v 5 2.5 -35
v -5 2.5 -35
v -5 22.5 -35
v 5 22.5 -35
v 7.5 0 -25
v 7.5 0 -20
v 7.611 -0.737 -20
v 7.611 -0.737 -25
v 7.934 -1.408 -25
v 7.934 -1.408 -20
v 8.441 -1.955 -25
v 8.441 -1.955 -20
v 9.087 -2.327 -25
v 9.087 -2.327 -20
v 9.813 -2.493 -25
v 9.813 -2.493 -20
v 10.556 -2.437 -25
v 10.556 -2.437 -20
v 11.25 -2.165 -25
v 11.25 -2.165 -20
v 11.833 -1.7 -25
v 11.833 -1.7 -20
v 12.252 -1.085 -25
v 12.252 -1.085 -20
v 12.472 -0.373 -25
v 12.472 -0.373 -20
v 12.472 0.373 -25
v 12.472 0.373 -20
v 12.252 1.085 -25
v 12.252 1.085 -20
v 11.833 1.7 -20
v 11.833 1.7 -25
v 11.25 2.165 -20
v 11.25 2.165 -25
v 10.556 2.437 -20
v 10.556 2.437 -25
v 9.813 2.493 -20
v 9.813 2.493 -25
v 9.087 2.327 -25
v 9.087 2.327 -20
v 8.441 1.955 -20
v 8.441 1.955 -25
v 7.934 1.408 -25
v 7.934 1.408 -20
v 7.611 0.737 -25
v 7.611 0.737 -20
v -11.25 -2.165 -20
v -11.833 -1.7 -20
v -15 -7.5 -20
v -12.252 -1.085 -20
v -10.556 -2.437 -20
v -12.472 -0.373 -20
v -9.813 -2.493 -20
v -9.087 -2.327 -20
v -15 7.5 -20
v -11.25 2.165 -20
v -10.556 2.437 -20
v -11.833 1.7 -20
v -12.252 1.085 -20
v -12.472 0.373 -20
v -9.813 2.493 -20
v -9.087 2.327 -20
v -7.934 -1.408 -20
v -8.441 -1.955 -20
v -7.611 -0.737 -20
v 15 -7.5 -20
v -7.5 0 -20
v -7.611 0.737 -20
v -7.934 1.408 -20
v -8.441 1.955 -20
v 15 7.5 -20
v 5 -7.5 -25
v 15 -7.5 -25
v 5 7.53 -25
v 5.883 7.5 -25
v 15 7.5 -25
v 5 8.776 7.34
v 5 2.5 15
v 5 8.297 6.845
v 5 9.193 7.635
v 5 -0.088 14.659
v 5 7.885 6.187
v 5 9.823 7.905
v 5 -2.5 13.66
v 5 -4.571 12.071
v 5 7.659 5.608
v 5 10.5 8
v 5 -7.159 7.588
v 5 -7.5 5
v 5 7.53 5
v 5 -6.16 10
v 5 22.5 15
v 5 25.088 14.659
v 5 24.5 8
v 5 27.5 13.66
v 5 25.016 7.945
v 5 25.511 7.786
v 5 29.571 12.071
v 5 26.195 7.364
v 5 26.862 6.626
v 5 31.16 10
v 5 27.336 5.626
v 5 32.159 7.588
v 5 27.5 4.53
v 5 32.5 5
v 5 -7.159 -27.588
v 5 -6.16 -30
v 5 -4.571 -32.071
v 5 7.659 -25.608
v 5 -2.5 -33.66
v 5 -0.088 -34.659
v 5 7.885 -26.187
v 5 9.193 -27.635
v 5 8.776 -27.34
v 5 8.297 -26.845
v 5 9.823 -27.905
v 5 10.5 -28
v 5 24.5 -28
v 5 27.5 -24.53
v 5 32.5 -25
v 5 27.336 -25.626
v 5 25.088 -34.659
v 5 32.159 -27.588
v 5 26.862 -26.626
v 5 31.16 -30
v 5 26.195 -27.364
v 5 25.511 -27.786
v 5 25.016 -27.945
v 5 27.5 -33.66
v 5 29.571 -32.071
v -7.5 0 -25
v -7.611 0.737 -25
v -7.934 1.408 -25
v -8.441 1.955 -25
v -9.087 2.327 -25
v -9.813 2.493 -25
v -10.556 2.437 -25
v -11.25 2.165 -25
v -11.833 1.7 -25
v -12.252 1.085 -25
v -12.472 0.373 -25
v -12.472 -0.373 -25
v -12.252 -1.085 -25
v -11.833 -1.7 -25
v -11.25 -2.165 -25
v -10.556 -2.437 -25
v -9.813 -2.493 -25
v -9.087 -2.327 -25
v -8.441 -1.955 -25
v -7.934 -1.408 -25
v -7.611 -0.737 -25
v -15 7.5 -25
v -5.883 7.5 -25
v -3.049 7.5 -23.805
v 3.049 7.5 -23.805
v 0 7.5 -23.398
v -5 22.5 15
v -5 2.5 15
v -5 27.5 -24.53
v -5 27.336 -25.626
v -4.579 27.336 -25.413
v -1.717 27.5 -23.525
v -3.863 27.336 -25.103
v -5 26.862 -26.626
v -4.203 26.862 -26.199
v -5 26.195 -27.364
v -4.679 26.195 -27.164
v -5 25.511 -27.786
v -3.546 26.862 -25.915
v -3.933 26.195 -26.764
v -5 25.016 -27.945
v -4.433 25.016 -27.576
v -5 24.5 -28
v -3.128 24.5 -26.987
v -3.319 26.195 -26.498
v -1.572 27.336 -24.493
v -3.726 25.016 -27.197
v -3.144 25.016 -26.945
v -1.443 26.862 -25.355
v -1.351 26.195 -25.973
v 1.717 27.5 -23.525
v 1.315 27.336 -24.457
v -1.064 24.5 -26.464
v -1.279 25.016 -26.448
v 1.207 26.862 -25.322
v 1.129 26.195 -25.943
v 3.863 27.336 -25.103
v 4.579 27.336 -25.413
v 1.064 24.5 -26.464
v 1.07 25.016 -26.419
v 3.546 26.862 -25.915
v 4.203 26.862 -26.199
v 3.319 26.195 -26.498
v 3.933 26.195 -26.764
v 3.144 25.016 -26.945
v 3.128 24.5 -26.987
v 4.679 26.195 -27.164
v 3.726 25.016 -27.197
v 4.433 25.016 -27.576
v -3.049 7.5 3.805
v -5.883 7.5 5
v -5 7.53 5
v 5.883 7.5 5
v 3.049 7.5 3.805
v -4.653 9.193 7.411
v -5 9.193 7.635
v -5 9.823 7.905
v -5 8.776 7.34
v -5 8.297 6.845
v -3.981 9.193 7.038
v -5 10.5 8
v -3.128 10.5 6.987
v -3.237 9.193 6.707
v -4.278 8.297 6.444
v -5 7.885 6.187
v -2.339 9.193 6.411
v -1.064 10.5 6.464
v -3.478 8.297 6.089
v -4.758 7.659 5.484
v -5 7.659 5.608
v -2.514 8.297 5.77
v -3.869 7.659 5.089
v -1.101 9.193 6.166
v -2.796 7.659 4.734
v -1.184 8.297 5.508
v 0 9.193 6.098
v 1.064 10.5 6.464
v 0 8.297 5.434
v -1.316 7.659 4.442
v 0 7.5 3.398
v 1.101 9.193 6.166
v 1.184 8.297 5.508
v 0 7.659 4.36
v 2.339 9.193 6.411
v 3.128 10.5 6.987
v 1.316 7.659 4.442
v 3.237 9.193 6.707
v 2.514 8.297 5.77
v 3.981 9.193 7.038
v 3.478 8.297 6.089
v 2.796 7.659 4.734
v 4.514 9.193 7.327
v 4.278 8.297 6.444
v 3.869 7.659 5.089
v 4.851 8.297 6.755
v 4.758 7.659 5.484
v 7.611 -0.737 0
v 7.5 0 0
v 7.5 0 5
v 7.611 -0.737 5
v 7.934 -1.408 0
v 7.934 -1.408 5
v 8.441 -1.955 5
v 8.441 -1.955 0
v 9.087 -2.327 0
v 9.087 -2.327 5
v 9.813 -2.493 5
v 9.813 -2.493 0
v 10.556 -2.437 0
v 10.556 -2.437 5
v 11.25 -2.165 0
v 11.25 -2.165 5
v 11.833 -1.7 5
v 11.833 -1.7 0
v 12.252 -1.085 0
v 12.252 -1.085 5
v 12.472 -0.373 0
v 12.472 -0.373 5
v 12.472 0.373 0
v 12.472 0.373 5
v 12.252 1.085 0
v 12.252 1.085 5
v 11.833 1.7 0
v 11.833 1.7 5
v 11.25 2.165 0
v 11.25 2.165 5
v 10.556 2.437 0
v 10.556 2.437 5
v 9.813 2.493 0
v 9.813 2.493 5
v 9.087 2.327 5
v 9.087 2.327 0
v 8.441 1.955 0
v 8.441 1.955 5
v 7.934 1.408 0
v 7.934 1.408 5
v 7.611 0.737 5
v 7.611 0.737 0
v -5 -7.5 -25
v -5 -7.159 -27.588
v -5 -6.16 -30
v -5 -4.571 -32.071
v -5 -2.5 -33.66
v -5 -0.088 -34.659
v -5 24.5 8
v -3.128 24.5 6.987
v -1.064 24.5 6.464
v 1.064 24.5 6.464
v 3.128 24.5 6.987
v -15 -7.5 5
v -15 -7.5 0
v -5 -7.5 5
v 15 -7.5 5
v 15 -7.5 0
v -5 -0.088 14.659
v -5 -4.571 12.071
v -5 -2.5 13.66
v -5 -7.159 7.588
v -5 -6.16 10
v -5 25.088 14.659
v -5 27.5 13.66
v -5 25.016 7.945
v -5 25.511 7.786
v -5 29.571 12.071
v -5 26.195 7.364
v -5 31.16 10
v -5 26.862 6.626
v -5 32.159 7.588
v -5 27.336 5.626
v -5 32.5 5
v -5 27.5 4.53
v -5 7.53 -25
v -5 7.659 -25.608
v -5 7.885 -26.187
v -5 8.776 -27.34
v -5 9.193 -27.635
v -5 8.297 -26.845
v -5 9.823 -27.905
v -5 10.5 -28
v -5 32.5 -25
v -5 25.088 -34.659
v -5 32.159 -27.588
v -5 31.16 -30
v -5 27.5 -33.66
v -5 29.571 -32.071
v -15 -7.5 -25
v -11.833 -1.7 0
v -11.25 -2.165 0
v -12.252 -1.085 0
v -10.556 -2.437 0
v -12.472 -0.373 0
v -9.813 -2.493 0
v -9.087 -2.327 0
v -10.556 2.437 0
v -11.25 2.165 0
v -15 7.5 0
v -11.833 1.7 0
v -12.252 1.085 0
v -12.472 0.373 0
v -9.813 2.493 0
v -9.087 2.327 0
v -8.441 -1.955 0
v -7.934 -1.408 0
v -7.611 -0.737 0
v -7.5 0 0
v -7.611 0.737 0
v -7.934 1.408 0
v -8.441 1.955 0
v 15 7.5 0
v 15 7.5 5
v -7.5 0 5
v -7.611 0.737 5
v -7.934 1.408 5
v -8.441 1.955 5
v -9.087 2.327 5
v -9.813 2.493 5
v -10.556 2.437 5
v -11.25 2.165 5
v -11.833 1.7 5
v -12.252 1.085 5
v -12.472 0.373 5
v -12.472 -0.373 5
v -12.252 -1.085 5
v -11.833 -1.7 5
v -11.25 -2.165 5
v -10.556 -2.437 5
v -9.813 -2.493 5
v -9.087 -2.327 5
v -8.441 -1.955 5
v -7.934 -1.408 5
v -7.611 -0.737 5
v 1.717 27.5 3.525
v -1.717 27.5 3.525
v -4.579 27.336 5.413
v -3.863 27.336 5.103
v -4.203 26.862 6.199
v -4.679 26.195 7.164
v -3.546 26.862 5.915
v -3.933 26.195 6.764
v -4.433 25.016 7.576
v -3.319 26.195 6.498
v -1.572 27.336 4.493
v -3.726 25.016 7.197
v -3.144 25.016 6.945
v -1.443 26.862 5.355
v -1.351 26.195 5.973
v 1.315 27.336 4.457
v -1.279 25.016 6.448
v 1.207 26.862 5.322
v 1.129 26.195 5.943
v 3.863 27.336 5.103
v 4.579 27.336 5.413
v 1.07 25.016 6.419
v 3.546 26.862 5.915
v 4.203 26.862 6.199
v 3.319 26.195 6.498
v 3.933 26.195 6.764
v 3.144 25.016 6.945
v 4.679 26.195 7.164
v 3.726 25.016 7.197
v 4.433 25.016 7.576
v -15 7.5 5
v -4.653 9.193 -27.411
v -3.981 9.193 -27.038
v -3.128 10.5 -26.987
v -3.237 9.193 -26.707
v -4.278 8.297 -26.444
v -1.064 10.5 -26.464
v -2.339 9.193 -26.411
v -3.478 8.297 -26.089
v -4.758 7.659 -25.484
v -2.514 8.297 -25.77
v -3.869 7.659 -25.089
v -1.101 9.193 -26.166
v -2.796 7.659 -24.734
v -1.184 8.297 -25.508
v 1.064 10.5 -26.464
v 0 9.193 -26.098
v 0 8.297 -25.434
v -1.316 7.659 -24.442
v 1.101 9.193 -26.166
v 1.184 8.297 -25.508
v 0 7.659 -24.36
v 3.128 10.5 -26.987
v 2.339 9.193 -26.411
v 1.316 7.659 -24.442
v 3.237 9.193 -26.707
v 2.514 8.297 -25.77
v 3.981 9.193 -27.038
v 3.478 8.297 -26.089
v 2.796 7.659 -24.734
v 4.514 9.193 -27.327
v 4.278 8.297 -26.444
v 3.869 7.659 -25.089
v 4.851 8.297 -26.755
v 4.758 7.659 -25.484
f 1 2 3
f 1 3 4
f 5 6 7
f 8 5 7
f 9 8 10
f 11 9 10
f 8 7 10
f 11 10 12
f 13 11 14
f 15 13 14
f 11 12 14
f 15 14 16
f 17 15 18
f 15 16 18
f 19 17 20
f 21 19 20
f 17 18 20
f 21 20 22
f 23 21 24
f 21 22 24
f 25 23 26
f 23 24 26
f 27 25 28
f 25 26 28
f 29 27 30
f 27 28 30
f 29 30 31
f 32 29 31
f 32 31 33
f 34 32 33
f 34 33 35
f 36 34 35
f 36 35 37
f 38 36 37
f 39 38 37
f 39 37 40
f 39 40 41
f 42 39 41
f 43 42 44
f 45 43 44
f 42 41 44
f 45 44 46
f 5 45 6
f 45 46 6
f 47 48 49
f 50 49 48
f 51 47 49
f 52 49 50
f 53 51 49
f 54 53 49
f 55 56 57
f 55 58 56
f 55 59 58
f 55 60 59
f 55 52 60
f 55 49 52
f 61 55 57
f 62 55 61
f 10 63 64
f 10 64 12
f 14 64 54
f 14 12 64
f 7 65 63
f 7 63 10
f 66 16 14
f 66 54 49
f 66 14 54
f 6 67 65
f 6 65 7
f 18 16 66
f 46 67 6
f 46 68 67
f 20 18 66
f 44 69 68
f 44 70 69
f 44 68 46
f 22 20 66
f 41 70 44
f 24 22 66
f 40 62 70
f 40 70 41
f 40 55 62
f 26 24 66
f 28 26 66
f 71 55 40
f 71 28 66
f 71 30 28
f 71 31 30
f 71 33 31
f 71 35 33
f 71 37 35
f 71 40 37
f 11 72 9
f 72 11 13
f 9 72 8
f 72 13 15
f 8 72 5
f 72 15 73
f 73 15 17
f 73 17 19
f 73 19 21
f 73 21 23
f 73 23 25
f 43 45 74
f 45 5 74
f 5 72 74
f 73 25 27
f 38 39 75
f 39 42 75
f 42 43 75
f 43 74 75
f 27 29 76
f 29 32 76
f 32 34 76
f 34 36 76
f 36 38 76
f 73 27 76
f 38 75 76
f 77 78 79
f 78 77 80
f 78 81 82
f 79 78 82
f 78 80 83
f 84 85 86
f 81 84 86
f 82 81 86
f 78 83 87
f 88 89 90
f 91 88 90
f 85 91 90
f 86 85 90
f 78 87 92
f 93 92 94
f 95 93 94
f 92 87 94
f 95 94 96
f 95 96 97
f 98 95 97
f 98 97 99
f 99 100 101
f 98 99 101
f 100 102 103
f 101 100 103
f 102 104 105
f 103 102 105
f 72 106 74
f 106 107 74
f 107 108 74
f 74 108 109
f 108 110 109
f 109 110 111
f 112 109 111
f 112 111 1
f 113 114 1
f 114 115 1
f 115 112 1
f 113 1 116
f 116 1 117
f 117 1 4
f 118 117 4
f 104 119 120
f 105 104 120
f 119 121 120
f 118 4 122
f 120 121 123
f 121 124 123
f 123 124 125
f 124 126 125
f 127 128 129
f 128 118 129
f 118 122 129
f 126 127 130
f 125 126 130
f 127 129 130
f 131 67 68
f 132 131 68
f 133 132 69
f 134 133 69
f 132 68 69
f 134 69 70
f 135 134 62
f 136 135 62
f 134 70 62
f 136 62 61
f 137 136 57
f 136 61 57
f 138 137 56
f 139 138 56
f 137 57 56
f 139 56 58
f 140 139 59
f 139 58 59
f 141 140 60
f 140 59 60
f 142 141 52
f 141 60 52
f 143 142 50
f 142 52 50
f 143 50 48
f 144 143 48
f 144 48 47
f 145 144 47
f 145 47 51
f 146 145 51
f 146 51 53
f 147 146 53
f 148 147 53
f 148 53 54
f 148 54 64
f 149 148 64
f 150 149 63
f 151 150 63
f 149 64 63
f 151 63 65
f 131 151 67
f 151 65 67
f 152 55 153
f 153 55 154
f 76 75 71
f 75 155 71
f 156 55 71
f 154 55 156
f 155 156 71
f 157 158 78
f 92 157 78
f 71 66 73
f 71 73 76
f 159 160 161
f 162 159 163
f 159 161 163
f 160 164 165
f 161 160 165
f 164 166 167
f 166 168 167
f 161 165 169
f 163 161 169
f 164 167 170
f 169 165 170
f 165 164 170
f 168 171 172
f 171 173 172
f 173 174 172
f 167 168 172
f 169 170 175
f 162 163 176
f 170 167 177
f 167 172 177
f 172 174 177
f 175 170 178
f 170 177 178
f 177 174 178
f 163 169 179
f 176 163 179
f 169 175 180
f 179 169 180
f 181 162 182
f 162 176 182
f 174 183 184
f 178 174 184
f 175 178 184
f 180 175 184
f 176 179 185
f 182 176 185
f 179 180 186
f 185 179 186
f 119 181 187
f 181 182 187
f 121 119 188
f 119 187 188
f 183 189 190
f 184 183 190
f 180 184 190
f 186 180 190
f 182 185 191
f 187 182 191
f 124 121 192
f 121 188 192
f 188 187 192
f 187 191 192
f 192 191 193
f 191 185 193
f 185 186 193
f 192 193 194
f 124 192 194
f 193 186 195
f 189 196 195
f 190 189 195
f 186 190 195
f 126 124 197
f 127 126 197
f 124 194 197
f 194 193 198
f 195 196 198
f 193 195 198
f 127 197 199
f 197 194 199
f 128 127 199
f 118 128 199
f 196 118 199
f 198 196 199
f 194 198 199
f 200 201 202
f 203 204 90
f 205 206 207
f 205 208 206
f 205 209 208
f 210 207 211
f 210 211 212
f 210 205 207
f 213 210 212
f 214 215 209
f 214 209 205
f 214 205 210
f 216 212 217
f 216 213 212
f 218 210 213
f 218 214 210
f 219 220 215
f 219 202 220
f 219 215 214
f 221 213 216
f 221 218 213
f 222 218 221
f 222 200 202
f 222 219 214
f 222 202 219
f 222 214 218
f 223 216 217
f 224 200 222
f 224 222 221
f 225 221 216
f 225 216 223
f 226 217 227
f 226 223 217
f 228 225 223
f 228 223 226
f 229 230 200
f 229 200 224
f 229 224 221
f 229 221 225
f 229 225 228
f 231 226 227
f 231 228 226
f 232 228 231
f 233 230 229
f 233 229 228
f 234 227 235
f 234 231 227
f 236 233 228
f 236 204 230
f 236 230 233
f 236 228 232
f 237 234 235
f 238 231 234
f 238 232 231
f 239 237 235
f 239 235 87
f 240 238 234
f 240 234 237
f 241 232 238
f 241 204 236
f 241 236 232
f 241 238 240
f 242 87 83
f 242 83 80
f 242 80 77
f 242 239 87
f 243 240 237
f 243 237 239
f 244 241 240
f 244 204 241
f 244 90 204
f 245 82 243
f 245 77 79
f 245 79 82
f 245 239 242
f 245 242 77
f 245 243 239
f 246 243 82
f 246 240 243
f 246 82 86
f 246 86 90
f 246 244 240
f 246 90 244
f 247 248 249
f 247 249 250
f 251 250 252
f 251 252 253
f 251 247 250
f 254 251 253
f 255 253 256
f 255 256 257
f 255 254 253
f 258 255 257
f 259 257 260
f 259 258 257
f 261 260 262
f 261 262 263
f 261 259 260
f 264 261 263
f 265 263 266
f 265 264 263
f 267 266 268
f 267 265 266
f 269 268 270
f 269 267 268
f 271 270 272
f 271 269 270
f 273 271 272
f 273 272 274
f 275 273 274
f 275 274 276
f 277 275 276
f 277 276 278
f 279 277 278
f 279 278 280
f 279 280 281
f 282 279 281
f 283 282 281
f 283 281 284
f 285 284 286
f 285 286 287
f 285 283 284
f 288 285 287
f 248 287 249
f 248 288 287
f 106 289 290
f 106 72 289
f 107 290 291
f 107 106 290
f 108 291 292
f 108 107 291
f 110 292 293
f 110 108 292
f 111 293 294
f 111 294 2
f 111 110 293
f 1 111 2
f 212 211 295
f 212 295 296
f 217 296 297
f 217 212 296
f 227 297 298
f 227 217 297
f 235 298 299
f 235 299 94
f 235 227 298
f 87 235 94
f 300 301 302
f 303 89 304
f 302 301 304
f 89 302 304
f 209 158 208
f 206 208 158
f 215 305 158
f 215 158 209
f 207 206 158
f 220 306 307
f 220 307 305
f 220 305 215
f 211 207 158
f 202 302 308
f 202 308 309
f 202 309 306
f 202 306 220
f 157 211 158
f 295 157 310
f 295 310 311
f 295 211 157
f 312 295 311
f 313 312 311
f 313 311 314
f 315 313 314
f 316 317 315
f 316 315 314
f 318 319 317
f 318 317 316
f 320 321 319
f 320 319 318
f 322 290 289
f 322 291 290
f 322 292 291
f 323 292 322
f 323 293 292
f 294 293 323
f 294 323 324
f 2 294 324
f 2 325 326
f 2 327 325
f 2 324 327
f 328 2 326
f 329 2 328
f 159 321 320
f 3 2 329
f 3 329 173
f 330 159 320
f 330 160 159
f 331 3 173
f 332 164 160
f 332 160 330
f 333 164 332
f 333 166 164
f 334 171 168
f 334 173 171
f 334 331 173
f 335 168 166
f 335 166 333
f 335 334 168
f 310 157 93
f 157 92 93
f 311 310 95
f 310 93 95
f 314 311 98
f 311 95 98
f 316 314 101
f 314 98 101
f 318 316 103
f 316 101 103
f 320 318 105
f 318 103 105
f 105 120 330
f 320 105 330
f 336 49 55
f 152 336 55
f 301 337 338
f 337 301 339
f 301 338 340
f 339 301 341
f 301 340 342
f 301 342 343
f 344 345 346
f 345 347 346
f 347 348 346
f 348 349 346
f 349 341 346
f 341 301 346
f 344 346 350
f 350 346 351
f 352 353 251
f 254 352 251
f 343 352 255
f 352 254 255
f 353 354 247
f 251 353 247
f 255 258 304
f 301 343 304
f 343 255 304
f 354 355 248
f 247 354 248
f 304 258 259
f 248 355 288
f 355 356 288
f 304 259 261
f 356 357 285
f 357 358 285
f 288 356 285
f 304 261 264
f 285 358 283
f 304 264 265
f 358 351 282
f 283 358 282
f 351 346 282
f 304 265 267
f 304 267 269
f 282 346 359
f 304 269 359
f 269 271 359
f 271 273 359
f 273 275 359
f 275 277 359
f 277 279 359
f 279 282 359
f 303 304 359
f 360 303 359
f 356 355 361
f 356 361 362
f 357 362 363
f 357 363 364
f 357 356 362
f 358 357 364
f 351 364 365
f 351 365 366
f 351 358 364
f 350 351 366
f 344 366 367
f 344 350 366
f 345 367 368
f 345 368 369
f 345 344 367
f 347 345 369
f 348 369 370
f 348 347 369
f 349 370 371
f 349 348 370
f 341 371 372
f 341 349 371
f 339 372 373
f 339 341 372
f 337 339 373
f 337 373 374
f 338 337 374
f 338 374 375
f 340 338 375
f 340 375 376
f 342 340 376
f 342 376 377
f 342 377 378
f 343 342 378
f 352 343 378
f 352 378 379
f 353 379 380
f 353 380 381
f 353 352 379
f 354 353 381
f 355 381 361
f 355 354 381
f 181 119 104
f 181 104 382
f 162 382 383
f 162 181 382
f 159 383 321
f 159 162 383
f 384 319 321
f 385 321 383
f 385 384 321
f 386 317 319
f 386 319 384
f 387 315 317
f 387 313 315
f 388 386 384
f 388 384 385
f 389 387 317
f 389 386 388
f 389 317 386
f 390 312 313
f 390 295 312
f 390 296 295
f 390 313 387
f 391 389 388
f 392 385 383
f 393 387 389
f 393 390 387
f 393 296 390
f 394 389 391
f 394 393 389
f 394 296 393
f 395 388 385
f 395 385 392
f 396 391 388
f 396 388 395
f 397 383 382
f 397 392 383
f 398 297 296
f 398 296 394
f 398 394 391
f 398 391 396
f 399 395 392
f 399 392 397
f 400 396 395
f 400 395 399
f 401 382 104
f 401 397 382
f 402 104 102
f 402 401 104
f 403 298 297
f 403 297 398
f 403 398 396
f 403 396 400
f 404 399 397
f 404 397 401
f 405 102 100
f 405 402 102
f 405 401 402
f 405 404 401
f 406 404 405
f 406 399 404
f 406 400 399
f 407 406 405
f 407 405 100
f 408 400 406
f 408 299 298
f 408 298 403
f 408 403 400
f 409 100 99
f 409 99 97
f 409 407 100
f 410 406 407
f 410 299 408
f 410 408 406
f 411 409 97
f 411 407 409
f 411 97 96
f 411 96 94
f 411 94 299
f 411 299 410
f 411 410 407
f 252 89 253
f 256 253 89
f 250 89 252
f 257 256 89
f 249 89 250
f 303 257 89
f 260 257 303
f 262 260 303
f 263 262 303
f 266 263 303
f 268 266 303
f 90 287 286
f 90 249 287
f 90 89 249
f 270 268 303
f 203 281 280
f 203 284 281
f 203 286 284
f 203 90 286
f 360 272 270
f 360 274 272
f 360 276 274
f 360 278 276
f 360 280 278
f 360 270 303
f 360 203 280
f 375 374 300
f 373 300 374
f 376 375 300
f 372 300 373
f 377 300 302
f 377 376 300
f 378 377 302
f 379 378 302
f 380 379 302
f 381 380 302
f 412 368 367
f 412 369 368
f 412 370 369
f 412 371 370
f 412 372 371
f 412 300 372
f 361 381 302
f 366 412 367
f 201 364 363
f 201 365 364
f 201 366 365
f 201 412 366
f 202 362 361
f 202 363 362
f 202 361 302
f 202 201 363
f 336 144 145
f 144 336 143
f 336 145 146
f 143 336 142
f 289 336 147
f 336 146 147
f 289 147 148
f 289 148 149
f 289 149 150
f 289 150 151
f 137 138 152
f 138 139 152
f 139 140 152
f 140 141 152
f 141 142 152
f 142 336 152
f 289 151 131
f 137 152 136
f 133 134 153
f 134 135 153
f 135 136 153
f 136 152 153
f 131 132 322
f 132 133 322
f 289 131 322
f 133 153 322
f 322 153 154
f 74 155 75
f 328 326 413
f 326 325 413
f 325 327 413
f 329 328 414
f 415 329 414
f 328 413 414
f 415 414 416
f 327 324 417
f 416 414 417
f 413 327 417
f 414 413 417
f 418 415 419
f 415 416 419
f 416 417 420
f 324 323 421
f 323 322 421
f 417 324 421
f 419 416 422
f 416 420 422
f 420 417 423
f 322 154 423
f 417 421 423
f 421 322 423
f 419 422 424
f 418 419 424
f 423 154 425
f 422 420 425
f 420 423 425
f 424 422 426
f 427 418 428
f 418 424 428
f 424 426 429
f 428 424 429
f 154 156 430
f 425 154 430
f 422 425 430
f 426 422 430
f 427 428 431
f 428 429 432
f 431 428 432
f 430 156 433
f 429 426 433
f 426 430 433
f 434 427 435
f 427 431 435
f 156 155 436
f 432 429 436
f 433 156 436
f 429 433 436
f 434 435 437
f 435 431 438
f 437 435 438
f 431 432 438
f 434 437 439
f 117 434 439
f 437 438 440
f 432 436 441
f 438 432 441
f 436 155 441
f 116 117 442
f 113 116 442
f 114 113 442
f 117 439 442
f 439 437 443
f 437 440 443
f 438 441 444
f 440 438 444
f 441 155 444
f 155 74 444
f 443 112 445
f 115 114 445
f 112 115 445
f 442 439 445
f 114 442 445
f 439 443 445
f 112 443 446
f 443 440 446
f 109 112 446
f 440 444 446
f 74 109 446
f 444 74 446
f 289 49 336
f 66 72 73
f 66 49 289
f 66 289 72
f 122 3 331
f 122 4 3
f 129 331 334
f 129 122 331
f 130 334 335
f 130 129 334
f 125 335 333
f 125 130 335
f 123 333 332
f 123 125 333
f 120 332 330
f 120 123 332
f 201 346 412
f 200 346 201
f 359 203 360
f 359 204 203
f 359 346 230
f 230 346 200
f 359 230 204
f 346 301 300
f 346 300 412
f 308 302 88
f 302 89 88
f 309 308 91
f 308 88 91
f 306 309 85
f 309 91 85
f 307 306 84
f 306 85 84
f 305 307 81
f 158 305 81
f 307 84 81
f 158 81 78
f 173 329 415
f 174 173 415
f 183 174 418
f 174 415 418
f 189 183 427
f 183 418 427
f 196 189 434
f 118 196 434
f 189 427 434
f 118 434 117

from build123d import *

# Parameters (mm, degrees)
ESQUISSE1_W        = 30
ESQUISSE1_H        = 15
ESQUISSE1_R        = 2.5
BOSS_EXTRU_2_DEPTH = 5
ESQUISSE2_W        = 10
ESQUISSE2_H        = 15
BOSS_EXTRU_3_DEPTH = 10
ESQUISSE3_W        = 10
ESQUISSE3_H        = 7
BOSS_EXTRU_5_DEPTH = 25
BOSS_EXTRU_6_DEPTH = 20
ESQUISSE4_W        = 10
ESQUISSE4_H        = 5
BOSS_EXTRU_7_DEPTH = 18
CONG_1_R           = 10
CONG_2_R           = 3


with BuildPart() as part:
    # Esquisse1 → Boss.-Extru.2 (new body)
    with BuildSketch(Plane.XY):
        Rectangle(ESQUISSE1_W, ESQUISSE1_H)
        with Locations((-10, 0)):
            Circle(ESQUISSE1_R, mode=Mode.SUBTRACT)
        with Locations((10, 0)):
            Circle(ESQUISSE1_R, mode=Mode.SUBTRACT)
    extrude(amount=BOSS_EXTRU_2_DEPTH)

    # Esquisse2 → Boss.-Extru.3 (add)
    with BuildSketch(Plane.XY.offset(5)):
        Rectangle(ESQUISSE2_W, ESQUISSE2_H)
    extrude(amount=BOSS_EXTRU_3_DEPTH)

    # Esquisse3 → Boss.-Extru.5 (add)
    with BuildSketch(Plane(origin=(0, 7.5, 0), x_dir=(1, 0, 0), z_dir=(0, 1, 0))):
        with Locations((0, -11.5)):
            Rectangle(ESQUISSE3_W, ESQUISSE3_H)
    extrude(amount=BOSS_EXTRU_5_DEPTH)

    # Esquisse3<4> → Boss.-Extru.6 (add)
    with BuildSketch(Plane(origin=(0, 7.5, 0), x_dir=(1, 0, 0), z_dir=(0, 1, 0))):
        with BuildLine():
            ThreePointArc((5, -8), (0, -6.397674733), (-5, -8))
            Line((-5, -8), (5, -8))
        make_face()
    extrude(amount=BOSS_EXTRU_6_DEPTH)

    # Esquisse4 → Boss.-Extru.7 (add)
    with BuildSketch(Plane(origin=(0, 0, 8), x_dir=(-1, 0, 0), z_dir=(0, 0, -1))):
        with Locations((0, 30)):
            Rectangle(ESQUISSE4_W, ESQUISSE4_H)
    extrude(amount=BOSS_EXTRU_7_DEPTH)

    # Congé1
    cong_1_edges = [part.edges().sort_by_distance(p)[0] for p in [
        (0, -7.5, 15),
        (0, 32.5, 15),
    ]]
    fillet(cong_1_edges, radius=CONG_1_R)

    # Congé2
    cong_2_edges = [part.edges().sort_by_distance(p)[0] for p in [
        (0, 7.5, 6.397674733),
        (0, 27.5, 6.397674733),
    ]]
    fillet(cong_2_edges, radius=CONG_2_R)

    # Symétrie3: part across plane


with BuildPart() as part_1:
    add(part.part)
    add(part.part.mirror(Plane(origin=(0, 0, -10), x_dir=(1, 0, 0), z_dir=(0, 0, -1))))


solid = part_1.part
